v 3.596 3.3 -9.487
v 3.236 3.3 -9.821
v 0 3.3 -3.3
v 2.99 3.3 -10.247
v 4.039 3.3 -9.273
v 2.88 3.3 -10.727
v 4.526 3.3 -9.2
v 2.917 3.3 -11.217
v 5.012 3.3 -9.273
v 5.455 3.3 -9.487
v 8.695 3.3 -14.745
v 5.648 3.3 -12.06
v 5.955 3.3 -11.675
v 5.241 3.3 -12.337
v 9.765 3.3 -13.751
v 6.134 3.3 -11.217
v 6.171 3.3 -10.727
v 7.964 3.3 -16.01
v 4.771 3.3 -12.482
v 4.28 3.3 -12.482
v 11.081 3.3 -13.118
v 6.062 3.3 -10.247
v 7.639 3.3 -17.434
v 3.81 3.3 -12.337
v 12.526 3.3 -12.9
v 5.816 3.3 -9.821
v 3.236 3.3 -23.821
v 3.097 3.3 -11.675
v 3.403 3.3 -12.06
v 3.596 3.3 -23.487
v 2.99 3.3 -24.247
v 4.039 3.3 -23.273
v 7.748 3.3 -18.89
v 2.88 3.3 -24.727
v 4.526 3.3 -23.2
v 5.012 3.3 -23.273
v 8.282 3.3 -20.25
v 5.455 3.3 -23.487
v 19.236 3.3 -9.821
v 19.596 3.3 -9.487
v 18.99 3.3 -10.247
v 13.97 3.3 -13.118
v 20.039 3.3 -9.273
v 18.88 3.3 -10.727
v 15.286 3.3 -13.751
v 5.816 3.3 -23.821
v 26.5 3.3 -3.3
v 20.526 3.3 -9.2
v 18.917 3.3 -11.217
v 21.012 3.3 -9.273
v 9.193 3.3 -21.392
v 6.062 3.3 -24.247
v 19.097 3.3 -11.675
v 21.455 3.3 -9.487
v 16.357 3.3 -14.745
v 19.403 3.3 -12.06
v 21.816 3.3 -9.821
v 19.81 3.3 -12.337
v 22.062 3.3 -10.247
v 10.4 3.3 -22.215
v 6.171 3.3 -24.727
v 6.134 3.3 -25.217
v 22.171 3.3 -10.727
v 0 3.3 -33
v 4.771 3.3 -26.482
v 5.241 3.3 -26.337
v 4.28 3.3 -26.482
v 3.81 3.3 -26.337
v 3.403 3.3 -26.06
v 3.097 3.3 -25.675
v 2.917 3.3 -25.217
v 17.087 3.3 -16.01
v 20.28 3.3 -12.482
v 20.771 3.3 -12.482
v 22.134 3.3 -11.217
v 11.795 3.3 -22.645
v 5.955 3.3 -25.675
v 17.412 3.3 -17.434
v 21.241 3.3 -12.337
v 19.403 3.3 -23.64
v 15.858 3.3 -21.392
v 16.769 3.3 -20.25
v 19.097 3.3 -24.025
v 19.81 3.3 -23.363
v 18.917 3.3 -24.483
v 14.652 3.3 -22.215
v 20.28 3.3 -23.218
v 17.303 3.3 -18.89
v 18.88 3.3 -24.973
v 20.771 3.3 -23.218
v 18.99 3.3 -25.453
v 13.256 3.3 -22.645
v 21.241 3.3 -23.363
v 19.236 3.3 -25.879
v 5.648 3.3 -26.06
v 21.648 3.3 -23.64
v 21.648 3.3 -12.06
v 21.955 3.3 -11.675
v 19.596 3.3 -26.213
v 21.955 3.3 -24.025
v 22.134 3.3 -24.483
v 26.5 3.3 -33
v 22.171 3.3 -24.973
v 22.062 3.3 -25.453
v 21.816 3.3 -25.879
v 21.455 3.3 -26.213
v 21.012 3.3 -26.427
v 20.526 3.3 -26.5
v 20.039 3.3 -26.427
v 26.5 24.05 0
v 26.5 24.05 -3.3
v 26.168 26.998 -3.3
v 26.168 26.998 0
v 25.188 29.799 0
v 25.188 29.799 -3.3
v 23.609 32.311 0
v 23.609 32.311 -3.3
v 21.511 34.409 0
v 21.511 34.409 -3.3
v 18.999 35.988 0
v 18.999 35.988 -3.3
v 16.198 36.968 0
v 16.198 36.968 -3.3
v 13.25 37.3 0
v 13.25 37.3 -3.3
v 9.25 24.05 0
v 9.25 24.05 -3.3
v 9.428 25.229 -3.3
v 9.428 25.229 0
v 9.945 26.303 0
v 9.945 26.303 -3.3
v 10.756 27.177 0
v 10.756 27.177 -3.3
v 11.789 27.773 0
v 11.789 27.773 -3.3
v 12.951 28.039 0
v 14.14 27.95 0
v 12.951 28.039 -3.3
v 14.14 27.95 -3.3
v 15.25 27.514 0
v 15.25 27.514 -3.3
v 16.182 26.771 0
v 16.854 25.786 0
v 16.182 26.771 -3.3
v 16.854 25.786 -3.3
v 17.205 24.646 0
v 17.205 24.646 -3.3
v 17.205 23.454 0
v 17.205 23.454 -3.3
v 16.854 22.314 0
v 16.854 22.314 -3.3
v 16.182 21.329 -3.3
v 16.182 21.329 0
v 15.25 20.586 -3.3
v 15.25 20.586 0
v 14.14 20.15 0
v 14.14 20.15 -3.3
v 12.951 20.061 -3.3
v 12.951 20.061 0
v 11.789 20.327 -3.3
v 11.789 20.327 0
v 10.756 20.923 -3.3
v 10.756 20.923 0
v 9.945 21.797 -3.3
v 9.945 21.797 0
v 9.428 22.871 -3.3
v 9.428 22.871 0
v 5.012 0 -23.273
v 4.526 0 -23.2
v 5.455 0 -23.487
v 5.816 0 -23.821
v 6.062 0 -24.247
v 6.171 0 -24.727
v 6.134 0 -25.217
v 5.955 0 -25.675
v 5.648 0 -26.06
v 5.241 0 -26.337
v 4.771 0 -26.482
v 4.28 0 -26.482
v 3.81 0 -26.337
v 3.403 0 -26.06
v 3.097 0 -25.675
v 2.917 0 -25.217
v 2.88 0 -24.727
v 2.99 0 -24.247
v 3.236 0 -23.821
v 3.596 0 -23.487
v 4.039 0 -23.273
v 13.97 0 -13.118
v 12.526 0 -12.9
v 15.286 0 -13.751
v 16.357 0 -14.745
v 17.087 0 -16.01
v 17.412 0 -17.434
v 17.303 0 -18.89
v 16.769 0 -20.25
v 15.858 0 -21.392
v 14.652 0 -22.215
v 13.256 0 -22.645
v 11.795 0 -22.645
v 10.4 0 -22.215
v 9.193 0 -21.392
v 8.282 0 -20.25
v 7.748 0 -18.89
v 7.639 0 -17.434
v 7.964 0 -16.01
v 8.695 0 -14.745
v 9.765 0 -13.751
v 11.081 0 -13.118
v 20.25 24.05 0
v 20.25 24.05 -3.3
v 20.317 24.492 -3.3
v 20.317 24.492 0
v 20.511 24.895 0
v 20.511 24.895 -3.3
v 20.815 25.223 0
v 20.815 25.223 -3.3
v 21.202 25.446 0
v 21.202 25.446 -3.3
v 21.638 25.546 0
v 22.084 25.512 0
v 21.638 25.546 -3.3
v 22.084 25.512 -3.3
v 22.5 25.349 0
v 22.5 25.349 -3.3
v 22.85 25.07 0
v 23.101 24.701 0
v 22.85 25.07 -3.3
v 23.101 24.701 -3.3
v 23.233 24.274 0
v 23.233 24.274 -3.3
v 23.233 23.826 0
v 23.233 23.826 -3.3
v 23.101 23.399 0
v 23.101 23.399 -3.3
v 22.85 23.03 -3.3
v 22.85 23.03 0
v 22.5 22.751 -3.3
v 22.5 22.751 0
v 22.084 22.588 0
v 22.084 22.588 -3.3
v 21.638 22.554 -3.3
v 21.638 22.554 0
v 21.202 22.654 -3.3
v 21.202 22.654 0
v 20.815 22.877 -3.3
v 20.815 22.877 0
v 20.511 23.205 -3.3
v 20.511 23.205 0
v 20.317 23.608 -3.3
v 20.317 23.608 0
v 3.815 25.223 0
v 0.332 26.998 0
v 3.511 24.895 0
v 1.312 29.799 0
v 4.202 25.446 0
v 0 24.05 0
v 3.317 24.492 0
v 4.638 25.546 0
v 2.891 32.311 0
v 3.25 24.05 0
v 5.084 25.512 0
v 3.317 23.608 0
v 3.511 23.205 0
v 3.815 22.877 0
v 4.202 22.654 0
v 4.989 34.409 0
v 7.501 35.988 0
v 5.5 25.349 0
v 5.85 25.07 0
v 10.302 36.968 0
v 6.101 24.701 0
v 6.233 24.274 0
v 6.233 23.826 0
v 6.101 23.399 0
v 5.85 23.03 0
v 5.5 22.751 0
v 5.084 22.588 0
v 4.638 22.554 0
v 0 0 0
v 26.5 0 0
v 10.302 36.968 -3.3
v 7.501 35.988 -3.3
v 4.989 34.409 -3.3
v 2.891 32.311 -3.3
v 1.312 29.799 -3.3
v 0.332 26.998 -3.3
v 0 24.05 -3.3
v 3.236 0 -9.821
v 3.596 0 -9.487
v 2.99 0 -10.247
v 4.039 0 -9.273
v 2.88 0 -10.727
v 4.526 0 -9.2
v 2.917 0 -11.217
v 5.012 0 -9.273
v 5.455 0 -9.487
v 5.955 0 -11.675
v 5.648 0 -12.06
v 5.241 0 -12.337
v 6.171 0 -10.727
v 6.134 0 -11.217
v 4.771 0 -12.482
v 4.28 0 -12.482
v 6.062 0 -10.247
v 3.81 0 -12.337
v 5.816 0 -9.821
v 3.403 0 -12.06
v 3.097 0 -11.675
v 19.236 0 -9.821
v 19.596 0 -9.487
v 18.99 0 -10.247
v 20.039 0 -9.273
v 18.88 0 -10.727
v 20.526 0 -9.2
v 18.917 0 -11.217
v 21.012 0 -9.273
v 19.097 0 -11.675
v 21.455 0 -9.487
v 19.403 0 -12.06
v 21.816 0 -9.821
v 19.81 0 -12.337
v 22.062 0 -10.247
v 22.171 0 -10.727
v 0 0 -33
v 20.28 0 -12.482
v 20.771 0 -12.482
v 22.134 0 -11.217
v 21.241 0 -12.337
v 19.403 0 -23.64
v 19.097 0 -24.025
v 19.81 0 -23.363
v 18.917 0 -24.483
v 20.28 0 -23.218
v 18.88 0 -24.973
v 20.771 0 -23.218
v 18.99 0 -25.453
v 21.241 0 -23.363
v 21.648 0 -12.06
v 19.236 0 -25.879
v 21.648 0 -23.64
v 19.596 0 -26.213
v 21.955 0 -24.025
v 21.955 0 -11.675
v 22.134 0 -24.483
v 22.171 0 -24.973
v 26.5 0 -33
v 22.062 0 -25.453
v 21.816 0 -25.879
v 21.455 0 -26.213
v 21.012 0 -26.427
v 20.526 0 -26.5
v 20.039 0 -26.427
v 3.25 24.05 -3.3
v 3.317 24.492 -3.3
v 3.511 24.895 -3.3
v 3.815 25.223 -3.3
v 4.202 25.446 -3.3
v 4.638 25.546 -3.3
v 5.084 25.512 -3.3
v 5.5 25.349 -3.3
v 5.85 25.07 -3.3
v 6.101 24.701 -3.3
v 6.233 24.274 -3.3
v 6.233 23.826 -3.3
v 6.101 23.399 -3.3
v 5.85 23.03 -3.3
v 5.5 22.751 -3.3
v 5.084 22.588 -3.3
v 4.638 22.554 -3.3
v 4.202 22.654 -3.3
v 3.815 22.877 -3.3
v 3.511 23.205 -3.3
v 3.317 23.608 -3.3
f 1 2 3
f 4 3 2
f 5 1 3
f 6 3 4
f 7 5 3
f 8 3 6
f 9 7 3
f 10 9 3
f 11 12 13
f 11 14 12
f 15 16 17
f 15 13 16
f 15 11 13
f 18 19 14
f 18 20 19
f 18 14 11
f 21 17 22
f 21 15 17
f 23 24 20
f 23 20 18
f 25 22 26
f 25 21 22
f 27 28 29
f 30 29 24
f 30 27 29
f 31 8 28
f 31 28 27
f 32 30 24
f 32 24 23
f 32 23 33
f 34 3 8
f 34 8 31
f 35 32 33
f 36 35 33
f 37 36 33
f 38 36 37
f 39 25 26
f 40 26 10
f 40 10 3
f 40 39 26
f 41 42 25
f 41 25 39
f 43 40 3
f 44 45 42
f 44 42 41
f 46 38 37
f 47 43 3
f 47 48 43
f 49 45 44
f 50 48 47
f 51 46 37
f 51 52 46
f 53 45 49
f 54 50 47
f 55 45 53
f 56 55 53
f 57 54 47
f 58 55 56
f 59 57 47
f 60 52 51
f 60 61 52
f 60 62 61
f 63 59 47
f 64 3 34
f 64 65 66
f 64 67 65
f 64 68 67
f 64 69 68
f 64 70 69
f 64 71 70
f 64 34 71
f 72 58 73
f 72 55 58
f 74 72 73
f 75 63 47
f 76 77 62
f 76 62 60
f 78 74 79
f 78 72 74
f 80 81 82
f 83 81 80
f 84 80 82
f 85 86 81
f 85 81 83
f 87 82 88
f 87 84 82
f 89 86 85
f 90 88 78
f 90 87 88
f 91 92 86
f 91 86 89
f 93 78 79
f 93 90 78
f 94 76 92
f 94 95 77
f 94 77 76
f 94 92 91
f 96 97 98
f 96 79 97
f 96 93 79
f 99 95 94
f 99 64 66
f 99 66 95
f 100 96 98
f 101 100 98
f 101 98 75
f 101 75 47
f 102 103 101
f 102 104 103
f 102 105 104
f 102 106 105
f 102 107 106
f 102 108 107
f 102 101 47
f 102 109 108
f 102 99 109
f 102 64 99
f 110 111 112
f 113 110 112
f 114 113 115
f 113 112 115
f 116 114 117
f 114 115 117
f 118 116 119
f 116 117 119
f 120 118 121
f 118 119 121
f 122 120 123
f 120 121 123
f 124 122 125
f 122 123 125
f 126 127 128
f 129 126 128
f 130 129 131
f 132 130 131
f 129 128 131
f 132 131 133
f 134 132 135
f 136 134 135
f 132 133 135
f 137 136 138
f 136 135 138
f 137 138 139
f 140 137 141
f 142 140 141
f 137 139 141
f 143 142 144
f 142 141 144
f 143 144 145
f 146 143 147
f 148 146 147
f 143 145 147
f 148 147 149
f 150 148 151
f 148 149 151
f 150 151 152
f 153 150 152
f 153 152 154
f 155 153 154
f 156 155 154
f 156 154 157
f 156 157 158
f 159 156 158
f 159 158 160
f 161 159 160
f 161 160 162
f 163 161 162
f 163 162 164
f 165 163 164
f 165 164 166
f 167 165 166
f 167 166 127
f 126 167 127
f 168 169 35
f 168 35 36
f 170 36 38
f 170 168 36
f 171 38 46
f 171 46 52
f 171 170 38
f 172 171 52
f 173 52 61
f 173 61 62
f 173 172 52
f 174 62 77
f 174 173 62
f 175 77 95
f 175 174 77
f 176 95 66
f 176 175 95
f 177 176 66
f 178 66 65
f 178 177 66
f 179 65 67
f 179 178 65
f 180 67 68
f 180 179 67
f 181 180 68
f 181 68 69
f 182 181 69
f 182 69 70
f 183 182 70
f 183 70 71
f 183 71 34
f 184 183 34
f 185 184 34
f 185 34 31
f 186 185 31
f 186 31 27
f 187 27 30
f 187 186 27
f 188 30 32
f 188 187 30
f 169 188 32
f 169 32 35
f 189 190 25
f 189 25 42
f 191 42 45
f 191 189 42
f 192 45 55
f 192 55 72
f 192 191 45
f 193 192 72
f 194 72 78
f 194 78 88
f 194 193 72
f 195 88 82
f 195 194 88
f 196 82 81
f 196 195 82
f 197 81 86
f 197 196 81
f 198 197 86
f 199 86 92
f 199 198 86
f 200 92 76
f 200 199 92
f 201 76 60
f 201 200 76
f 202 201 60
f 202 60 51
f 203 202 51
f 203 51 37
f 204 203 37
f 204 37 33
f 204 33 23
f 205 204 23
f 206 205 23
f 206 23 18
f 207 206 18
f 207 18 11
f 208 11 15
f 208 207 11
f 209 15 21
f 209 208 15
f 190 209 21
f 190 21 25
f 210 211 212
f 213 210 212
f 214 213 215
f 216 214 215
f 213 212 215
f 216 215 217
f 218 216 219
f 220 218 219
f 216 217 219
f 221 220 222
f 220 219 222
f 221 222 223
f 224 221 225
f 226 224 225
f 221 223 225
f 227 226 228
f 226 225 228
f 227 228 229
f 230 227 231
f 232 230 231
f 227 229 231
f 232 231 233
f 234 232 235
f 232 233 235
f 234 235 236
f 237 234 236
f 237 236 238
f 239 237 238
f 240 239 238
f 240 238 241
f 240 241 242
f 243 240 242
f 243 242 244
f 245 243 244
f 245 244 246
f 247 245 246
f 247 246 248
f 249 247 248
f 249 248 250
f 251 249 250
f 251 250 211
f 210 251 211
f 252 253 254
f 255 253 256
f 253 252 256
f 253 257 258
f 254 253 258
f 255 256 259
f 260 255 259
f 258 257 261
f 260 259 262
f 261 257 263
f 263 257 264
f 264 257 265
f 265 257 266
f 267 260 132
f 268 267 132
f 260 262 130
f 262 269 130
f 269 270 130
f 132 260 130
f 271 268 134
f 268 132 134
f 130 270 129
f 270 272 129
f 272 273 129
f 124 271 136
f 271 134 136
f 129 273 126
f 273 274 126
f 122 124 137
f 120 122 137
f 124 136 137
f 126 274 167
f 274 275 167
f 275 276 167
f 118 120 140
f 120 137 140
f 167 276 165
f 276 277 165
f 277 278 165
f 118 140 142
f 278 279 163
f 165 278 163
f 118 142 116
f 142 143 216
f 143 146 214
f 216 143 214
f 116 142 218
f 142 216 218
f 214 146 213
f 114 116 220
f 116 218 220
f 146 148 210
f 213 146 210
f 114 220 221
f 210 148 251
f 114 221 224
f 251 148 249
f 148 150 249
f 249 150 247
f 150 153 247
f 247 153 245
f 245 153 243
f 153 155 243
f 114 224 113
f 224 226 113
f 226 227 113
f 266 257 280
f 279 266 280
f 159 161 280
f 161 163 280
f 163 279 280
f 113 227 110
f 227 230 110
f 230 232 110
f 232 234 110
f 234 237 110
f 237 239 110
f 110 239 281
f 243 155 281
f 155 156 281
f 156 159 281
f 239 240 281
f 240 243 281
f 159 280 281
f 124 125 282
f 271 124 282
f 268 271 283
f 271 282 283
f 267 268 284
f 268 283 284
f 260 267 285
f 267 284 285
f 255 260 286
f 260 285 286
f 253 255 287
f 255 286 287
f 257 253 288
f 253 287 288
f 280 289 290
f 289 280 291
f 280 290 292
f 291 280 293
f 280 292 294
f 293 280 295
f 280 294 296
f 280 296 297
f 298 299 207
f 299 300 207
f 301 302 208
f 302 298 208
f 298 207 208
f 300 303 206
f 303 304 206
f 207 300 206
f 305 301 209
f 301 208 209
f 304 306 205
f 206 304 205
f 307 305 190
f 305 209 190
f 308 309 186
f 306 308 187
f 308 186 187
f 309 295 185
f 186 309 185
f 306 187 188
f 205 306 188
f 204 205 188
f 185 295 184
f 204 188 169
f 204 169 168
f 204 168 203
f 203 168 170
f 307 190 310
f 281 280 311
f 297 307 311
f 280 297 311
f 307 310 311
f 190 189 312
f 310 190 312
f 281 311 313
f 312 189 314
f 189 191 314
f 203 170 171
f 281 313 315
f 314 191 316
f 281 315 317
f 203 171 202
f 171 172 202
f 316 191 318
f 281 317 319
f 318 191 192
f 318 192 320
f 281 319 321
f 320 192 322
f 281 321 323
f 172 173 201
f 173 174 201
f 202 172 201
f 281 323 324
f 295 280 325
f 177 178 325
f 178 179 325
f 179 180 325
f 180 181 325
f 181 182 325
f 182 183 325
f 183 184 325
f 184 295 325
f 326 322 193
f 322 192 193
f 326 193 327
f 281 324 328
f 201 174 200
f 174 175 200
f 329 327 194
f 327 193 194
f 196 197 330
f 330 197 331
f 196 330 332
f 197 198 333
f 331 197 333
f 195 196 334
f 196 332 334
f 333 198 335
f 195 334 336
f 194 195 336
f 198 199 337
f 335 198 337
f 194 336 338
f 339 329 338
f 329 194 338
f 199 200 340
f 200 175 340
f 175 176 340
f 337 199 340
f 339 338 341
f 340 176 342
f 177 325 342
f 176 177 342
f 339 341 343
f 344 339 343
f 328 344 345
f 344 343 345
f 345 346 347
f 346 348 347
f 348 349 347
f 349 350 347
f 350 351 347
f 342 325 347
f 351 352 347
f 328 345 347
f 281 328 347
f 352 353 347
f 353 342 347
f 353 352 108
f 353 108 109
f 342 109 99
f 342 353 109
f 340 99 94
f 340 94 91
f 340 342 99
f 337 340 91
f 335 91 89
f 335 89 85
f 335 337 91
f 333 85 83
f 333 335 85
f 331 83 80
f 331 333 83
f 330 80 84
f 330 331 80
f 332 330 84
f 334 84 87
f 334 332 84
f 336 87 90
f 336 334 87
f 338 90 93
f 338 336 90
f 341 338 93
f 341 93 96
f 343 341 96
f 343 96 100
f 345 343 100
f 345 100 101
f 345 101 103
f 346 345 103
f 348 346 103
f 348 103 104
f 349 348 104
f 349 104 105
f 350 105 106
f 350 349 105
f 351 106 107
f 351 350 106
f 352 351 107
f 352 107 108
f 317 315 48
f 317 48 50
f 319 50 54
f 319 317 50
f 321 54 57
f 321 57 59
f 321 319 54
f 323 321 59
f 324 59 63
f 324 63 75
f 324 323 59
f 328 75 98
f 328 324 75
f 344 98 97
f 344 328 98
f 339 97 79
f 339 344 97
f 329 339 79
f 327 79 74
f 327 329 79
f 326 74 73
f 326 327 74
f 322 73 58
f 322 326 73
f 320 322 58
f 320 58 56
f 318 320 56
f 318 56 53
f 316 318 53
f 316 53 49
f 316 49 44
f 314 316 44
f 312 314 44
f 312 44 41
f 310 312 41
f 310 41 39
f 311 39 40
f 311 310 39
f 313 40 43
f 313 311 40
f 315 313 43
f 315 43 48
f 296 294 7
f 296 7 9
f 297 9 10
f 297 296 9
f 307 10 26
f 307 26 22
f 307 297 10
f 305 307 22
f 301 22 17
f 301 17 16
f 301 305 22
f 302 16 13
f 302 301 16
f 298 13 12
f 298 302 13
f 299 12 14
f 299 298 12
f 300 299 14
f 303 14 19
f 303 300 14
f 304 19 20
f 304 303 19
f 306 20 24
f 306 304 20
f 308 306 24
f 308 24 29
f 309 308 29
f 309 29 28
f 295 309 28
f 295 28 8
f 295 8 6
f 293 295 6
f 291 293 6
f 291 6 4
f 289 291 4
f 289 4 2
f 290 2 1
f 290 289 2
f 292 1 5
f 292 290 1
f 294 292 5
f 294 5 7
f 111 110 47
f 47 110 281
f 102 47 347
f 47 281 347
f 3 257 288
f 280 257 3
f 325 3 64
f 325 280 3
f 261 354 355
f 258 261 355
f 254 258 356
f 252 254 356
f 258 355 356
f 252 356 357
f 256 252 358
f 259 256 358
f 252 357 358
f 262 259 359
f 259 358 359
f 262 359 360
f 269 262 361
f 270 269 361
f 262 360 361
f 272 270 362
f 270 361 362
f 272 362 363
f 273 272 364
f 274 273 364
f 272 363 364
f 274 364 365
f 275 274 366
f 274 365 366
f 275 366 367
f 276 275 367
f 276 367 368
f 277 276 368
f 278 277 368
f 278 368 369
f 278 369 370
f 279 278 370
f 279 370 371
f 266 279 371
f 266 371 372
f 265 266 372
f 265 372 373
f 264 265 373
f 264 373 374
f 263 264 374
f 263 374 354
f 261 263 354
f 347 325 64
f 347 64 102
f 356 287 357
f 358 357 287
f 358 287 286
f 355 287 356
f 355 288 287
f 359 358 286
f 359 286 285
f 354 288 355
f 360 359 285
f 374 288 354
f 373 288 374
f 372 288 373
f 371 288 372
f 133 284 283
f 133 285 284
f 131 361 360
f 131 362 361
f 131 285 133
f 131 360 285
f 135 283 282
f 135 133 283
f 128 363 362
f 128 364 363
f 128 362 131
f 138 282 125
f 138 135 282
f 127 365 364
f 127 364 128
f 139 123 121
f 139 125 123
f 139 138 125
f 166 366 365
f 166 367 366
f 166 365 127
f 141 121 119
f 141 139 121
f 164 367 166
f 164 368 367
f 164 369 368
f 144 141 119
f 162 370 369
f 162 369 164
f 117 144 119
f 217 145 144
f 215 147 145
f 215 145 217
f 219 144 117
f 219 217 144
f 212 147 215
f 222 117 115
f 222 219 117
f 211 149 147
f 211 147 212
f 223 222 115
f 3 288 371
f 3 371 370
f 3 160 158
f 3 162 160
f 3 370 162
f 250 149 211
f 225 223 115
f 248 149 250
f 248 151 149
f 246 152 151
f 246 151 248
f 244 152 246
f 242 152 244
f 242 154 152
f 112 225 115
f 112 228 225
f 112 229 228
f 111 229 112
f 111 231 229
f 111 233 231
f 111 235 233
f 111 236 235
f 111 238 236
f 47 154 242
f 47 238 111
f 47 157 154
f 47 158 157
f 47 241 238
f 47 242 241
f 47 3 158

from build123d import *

# Parameters (mm, degrees)
SKETCH_1_W          = 26.5
SKETCH_1_H          = 33
SKETCH_1_R          = 4.9
SKETCH_1_R_2        = 1.65
EXTRUDE_1_DEPTH     = 3.3
SKETCH_2_W          = 26.5
SKETCH_2_H          = 3.3
EXTRUDE_2_DEPTH     = 34
CUT_EXTRUDE_3_DEPTH = 34
SKETCH_4_R          = 4
SKETCH_4_R_2        = 1.5
CUT_EXTRUDE_4_DEPTH = 34


with BuildPart() as part:
    # 草图1 → 凸台-拉伸1 (new body)
    with BuildSketch(Plane(origin=(0, 0, 0), x_dir=(1, 0, 0), z_dir=(0, 1, 0))):
        with Locations((13.25, 16.5)):
            Rectangle(SKETCH_1_W, SKETCH_1_H)
        with Locations(Location((12.525580031, 17.8, 0), (0, 0, 270))):
            Circle(SKETCH_1_R, mode=Mode.SUBTRACT)
        with Locations(Location((4.525580031, 24.85, 0), (0, 0, 270))):
            Circle(SKETCH_1_R_2, mode=Mode.SUBTRACT)
        with Locations(Location((20.525580031, 24.85, 0), (0, 0, 90))):
            Circle(SKETCH_1_R_2, mode=Mode.SUBTRACT)
        with Locations(Location((4.525580031, 10.85, 0), (0, 0, 270))):
            Circle(SKETCH_1_R_2, mode=Mode.SUBTRACT)
        with Locations(Location((20.525580031, 10.85, 0), (0, 0, 270))):
            Circle(SKETCH_1_R_2, mode=Mode.SUBTRACT)
    extrude(amount=EXTRUDE_1_DEPTH)

    # 草图2 → 凸台-拉伸2 (add)
    with BuildSketch(Plane(origin=(0, 3.3, 0), x_dir=(1, 0, 0), z_dir=(0, 1, 0))):
        with Locations((13.25, 1.65)):
            Rectangle(SKETCH_2_W, SKETCH_2_H)
    extrude(amount=EXTRUDE_2_DEPTH)

    # 草图3 → 切除-拉伸3 (cut)
    with BuildSketch(Plane(origin=(0, 0, -3.3), x_dir=(-1, 0, 0), z_dir=(0, 0, -1))):
        with BuildLine():
            Line((-26.5, 37.3), (-26.5, 24.05))
            ThreePointArc((-26.5, 24.05), (-22.619164851, 33.419164851), (-13.25, 37.3))
            Line((-13.25, 37.3), (-26.5, 37.3))
        make_face()
        with BuildLine():
            ThreePointArc((-13.25, 37.3), (-3.880835149, 33.419164851), (0, 24.05))
            Line((0, 24.05), (0, 37.3))
            Line((0, 37.3), (-13.25, 37.3))
        make_face()
    extrude(amount=-CUT_EXTRUDE_3_DEPTH, mode=Mode.SUBTRACT)

    # 草图4 → 切除-拉伸4 (cut)
    with BuildSketch(Plane(origin=(0, 0, -3.3), x_dir=(-1, 0, 0), z_dir=(0, 0, -1))):
        with Locations((-13.25, 24.05)):
            Circle(SKETCH_4_R)
        with Locations((-4.75, 24.05)):
            Circle(SKETCH_4_R_2)
        with Locations((-21.75, 24.05)):
            Circle(SKETCH_4_R_2)
    extrude(amount=-CUT_EXTRUDE_4_DEPTH, mode=Mode.SUBTRACT)


solid = part.part
